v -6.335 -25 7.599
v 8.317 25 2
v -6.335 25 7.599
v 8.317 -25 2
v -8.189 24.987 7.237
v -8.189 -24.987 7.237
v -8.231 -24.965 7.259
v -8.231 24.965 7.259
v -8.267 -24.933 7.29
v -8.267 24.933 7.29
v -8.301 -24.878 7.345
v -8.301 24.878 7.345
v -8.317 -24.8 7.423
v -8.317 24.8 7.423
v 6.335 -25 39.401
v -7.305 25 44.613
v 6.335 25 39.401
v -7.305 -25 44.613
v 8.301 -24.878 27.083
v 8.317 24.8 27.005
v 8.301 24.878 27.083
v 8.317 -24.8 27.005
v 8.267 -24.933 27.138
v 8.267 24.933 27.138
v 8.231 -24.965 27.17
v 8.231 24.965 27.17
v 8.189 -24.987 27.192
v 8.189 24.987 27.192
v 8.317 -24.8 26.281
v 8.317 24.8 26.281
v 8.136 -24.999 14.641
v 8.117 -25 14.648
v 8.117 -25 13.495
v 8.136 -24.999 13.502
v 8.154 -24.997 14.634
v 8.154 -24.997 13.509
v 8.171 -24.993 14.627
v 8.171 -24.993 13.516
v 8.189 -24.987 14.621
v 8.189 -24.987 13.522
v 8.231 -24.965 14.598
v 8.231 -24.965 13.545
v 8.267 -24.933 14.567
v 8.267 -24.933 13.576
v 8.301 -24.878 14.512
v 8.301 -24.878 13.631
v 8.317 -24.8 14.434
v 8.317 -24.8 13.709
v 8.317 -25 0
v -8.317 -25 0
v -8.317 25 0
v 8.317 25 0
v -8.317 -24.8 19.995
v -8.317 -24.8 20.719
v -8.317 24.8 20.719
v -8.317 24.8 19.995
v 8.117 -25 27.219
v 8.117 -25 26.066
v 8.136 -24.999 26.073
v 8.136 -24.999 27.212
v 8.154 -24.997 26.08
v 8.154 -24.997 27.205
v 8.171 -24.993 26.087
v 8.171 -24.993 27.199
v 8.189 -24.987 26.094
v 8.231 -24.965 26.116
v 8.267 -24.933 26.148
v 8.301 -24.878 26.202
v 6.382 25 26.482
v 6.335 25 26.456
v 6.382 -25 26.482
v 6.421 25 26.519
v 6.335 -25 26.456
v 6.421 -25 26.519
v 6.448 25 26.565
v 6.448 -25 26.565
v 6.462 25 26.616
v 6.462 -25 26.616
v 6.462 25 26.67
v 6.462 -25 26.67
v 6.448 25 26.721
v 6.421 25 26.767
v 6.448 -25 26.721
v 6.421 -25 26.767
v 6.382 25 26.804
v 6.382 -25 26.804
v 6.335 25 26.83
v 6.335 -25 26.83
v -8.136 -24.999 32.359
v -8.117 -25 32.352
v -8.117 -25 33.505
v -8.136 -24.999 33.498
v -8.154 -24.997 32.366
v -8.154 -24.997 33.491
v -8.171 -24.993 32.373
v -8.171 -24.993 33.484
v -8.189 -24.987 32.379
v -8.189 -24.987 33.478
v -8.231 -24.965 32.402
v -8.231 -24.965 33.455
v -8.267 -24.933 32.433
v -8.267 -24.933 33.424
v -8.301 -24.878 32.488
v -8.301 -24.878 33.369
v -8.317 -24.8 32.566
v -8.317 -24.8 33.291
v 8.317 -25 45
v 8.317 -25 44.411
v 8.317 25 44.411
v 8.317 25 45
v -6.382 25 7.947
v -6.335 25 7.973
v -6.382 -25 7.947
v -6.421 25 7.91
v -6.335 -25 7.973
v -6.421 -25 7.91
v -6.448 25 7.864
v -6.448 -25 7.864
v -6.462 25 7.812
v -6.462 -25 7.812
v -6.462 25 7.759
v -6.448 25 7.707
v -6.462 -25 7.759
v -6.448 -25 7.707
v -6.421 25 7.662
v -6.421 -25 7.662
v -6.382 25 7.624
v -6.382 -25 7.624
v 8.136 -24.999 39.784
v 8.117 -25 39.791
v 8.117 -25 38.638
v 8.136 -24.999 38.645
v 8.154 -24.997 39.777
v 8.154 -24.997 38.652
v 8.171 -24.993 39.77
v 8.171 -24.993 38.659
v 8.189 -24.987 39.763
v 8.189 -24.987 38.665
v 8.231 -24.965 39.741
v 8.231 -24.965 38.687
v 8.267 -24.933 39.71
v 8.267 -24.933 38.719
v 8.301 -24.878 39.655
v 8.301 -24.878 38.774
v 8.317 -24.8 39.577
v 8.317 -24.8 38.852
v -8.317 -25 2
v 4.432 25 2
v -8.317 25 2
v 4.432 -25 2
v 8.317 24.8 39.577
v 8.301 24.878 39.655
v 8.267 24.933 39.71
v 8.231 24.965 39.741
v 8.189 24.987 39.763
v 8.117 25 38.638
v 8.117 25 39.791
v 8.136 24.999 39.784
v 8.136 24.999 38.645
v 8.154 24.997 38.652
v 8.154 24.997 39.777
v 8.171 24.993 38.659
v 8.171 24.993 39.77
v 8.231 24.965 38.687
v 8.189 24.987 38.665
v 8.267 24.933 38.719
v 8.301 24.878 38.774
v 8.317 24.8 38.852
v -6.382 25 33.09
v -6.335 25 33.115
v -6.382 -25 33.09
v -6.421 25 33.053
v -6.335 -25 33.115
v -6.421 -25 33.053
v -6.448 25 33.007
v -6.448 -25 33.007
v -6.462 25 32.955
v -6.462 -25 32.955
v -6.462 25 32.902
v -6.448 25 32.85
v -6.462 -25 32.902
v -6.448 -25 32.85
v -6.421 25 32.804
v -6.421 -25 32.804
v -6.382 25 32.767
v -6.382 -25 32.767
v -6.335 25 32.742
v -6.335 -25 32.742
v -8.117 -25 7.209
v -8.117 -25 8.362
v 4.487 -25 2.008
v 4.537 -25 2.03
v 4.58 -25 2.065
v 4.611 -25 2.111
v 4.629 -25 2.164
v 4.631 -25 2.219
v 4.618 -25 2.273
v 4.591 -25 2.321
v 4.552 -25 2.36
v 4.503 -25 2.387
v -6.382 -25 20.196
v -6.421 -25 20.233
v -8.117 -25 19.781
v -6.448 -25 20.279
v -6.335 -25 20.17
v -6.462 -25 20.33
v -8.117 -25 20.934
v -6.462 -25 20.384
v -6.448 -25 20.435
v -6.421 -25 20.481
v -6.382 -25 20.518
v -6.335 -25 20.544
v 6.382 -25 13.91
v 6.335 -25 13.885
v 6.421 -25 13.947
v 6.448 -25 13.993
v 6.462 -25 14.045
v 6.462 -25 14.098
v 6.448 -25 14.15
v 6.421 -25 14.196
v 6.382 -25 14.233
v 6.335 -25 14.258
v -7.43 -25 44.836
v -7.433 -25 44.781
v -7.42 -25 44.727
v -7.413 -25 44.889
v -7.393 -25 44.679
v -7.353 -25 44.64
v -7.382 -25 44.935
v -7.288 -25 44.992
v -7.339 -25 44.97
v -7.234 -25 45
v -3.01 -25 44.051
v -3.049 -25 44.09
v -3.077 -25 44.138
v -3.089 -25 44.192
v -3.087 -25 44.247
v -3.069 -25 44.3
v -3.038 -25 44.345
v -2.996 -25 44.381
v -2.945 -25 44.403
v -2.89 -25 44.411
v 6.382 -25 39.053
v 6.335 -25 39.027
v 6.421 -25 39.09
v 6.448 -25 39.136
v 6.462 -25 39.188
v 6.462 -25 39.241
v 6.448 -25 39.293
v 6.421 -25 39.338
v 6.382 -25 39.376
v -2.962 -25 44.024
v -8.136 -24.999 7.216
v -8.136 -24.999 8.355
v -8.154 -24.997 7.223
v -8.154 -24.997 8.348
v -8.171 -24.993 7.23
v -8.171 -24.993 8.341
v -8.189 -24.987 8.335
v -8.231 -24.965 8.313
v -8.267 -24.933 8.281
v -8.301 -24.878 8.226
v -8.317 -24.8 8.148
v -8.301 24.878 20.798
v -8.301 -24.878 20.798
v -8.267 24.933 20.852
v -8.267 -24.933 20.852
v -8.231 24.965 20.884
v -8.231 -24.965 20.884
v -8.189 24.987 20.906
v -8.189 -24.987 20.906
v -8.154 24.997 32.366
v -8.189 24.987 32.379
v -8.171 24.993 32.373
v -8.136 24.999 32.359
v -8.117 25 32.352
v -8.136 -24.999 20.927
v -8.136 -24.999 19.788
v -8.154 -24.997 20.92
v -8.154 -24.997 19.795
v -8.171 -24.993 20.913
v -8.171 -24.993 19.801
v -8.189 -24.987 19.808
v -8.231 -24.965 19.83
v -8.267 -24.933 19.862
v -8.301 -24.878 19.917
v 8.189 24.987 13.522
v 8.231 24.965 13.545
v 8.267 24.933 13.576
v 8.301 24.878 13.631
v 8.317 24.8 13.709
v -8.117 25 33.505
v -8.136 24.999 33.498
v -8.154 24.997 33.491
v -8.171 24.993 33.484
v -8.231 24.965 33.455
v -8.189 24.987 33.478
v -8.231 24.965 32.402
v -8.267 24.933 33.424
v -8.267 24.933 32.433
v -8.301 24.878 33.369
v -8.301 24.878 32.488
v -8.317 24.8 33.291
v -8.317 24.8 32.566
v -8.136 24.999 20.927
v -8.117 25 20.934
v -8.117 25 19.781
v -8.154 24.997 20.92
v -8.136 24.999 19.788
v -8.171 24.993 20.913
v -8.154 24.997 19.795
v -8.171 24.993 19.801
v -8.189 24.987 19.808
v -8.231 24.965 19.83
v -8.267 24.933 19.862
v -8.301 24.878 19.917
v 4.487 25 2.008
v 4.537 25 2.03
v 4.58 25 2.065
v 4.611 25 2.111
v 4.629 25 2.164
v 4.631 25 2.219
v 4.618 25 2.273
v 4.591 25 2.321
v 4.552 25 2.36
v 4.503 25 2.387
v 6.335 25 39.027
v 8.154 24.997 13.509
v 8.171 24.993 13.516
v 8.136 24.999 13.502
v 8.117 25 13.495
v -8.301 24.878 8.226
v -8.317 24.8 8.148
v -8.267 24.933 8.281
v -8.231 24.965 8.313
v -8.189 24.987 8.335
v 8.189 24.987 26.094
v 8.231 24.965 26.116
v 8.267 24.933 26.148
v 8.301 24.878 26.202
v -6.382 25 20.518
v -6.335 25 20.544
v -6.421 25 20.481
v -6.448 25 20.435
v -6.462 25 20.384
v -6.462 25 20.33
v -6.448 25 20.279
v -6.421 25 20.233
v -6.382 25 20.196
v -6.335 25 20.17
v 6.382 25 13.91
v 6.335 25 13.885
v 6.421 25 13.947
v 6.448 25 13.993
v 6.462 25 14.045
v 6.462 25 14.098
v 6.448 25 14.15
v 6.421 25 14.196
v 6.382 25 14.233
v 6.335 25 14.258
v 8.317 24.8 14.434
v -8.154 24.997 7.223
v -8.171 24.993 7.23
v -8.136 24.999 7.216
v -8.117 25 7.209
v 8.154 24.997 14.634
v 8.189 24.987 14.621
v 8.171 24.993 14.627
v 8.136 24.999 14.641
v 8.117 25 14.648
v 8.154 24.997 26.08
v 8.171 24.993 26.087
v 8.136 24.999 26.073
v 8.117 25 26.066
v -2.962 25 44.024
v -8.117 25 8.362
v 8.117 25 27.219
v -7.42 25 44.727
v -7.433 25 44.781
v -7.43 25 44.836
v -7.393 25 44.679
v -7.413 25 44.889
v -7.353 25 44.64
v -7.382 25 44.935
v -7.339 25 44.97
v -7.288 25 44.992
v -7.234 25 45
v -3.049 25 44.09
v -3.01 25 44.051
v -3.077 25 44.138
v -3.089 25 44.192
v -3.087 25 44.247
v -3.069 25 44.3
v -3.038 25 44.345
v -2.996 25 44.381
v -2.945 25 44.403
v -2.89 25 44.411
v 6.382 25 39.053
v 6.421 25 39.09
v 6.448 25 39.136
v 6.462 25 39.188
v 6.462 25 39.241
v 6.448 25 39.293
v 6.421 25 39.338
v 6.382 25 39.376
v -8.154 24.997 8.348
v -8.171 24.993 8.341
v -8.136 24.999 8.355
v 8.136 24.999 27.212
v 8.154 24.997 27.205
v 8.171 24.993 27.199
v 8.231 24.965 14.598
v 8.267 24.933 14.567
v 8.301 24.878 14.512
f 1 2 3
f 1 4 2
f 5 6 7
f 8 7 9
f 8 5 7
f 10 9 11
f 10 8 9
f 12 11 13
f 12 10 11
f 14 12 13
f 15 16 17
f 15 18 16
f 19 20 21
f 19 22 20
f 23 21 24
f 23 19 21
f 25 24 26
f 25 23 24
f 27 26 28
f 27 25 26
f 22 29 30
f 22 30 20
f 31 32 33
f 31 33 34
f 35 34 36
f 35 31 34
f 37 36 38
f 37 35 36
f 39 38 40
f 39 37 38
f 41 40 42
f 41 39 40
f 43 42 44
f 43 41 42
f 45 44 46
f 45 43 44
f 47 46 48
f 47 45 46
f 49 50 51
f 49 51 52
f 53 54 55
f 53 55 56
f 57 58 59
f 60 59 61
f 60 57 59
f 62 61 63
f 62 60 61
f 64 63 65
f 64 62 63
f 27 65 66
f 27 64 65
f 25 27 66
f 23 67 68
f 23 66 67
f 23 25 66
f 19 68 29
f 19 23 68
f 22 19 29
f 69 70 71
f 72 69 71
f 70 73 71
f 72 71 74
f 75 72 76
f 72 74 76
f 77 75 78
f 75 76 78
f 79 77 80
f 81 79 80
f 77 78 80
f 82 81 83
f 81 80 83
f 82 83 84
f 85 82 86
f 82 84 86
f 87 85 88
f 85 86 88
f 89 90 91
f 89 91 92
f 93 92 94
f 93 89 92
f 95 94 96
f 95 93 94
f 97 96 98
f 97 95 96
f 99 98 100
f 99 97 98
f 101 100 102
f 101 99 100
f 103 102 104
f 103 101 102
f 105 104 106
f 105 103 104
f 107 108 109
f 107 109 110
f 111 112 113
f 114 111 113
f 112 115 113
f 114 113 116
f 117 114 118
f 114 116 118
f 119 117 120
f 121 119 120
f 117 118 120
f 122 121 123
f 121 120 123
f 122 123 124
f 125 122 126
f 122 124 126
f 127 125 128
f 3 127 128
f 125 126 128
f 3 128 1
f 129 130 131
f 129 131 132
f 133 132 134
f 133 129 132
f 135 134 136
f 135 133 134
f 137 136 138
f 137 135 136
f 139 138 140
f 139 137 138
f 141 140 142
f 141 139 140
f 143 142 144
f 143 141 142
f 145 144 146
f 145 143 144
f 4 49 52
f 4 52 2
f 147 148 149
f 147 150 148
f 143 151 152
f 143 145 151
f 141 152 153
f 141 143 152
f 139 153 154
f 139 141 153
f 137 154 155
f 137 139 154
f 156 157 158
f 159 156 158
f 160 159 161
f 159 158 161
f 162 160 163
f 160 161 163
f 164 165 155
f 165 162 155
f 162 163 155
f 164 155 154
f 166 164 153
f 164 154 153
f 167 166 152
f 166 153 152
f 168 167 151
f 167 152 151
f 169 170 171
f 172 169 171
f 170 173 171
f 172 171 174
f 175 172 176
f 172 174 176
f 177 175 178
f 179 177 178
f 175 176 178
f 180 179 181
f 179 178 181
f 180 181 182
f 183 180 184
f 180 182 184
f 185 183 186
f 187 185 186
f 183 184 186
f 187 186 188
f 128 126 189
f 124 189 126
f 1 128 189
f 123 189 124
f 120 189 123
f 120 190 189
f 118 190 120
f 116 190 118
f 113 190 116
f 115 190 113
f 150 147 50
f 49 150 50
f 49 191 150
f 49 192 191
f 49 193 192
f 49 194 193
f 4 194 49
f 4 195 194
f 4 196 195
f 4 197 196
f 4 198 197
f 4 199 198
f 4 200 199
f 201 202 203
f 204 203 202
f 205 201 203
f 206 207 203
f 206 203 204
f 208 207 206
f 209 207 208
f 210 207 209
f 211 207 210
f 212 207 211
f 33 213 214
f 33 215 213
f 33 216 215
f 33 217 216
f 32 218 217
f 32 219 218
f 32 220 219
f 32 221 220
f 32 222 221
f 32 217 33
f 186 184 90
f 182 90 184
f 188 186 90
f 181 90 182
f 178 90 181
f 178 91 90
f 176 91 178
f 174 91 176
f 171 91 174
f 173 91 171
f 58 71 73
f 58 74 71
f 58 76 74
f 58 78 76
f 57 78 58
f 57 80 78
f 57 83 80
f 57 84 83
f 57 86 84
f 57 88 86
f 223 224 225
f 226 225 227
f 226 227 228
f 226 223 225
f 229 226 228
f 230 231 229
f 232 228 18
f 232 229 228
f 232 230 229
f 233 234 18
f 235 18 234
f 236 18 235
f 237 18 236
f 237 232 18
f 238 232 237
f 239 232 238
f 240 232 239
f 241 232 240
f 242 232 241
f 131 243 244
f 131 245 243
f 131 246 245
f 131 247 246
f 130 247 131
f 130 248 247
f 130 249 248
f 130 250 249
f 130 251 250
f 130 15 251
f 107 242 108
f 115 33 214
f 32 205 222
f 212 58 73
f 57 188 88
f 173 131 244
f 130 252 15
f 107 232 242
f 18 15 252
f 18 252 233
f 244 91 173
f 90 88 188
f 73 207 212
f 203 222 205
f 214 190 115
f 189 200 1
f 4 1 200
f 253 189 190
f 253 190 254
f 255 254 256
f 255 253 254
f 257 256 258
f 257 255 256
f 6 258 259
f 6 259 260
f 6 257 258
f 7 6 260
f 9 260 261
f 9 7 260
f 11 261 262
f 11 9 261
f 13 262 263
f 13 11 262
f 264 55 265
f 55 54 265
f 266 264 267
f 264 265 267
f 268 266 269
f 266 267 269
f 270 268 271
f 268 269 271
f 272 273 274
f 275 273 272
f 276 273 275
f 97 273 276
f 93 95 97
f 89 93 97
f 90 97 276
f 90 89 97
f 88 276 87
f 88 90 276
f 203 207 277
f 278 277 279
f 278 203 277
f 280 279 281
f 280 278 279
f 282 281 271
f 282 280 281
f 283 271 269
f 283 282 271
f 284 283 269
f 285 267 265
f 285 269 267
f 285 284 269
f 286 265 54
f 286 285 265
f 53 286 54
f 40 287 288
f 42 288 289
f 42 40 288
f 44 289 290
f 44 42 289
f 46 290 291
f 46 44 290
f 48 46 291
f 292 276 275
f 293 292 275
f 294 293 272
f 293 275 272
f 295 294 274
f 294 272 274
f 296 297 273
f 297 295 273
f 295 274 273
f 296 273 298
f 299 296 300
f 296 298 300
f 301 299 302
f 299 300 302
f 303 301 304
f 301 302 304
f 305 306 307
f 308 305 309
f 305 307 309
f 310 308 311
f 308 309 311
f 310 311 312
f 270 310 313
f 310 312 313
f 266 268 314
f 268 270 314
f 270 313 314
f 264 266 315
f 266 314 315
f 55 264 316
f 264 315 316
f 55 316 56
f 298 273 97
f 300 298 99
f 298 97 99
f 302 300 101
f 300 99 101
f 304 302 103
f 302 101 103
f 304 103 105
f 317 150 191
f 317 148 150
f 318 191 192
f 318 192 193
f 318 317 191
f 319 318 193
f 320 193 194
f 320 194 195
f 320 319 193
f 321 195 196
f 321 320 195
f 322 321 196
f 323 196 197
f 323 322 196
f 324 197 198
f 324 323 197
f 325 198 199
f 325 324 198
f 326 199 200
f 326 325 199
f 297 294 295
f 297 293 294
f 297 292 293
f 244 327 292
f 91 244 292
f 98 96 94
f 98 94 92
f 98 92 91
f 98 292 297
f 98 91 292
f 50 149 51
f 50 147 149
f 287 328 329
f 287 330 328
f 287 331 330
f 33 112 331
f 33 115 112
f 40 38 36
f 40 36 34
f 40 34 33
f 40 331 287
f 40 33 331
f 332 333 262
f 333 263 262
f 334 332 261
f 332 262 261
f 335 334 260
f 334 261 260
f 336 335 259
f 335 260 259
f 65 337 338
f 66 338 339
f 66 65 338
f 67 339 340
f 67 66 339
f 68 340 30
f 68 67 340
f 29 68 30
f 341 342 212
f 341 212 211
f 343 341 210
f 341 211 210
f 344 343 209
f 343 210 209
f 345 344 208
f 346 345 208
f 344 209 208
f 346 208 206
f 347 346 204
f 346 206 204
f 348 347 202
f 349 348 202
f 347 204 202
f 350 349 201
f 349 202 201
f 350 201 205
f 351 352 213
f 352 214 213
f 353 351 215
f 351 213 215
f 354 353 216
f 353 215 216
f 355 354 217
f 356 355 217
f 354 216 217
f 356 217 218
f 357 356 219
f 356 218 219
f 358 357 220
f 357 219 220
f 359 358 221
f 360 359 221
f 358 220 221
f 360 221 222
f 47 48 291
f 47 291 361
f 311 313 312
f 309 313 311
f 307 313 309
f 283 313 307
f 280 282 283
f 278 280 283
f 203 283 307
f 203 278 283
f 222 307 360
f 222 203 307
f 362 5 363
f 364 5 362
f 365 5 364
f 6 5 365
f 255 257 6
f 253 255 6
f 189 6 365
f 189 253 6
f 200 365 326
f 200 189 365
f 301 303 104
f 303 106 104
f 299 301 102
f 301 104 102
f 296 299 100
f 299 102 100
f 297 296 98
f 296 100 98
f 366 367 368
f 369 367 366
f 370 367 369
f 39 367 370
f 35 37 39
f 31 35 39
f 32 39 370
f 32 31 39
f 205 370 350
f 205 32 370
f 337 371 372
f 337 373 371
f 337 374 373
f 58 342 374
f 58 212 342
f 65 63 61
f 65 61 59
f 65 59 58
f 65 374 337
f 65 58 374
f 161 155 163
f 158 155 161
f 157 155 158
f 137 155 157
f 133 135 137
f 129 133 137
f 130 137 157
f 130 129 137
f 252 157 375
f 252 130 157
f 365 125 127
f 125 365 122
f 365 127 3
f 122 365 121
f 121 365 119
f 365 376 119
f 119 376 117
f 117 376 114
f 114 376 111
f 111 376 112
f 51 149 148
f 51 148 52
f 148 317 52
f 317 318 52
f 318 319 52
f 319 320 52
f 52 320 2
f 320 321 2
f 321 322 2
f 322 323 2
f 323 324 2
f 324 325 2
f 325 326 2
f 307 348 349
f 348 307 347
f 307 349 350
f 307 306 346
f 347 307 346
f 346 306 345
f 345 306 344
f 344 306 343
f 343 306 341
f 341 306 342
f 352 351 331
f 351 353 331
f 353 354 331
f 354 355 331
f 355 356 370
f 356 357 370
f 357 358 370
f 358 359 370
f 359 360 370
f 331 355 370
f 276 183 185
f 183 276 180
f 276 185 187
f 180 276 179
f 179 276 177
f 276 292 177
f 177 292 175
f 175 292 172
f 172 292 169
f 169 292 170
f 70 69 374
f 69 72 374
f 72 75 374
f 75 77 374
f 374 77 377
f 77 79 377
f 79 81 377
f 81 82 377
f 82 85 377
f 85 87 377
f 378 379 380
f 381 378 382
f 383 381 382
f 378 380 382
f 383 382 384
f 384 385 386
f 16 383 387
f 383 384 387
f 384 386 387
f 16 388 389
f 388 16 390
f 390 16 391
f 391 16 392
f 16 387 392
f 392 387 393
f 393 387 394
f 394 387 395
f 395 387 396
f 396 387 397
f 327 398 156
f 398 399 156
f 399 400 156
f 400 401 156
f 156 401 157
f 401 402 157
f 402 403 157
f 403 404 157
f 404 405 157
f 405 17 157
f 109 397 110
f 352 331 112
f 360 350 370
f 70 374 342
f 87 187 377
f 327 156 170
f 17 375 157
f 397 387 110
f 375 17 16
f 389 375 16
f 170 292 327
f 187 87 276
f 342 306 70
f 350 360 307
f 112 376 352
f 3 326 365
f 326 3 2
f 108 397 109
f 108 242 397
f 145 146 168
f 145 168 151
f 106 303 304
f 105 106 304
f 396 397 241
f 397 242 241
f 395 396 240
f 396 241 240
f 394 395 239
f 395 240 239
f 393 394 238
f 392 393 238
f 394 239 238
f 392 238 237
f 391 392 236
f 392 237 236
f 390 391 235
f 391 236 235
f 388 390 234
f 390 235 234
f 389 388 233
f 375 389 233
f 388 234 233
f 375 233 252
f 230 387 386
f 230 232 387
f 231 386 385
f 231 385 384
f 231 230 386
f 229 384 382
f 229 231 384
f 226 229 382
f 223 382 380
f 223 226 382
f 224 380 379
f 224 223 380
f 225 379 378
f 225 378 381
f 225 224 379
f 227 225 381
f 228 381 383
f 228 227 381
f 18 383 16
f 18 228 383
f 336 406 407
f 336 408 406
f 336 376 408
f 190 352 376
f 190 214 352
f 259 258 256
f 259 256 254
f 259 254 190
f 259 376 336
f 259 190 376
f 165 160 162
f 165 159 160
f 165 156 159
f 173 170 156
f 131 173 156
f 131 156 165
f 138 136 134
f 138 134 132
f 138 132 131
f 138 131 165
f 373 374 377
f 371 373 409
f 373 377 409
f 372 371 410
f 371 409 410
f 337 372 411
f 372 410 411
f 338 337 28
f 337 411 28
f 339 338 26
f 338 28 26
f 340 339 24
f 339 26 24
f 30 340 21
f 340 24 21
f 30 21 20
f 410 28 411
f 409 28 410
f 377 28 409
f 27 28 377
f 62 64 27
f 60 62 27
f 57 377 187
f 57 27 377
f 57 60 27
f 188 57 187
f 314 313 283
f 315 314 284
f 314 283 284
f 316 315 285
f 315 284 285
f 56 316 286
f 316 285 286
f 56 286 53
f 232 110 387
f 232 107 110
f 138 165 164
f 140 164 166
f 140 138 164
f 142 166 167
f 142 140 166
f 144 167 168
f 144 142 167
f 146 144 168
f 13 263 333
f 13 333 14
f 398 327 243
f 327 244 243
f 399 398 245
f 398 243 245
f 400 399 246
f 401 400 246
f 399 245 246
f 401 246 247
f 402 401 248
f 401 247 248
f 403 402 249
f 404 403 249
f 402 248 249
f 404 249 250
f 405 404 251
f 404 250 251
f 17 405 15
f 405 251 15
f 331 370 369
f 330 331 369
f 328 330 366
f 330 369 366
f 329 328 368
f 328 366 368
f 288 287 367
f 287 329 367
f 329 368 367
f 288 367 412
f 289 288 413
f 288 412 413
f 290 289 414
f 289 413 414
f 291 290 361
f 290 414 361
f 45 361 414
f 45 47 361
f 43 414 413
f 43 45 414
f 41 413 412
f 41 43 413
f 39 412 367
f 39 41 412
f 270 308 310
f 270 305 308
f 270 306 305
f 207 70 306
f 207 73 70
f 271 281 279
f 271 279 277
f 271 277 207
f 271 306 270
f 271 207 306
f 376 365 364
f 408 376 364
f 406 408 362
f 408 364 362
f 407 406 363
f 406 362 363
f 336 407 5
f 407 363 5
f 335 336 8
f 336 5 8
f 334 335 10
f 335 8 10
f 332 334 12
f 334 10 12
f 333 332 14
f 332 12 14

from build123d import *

# Parameters (mm, degrees)
F1_DEPTH = 25
F2_R     = 0.2
F3_R     = 0.2


with BuildPart() as f1:
    # F0 (on Front) → F1 (new body, symmetric)
    with BuildSketch(Plane.XZ):
        Polygon((-8.317317, 2), (-8.317317, 0), (8.317317, 0), (8.317317, 2), (5.515711, 2), align=None)
        Polygon((-8.317317, 7.285714), (5.515711, 2), (8.317317, 2), (-6.82424, 7.785714), (8.317317, 13.571429), (8.317317, 14.571429), (-6.82424, 20.357143), (8.317317, 26.142857), (8.317317, 27.142857), (-6.82424, 32.928571), (8.317317, 38.714286), (8.317317, 39.714286), (-3.974019, 44.410907), (8.317317, 44.410907), (8.317317, 45), (-8.317317, 45), (6.82424, 39.214286), (-8.317317, 33.428571), (-8.317317, 32.428571), (6.82424, 26.642857), (-8.317317, 20.857143), (-8.317317, 19.857143), (6.82424, 14.071429), (-8.317317, 8.285714), align=None)
    extrude(amount=F1_DEPTH, both=True)

    # F2
    f2_edges = [f1.edges().sort_by_distance(p)[0] for p in [
        (-6.82424, 0, 32.928571),
        (-3.974019, 0, 44.410907),
        (-6.82424, 0, 20.357143),
        (-6.82424, 0, 7.785714),
        (5.515711, 0, 2),
        (6.82424, 0, 14.071429),
        (6.82424, 0, 26.642857),
        (6.82424, 0, 39.214286),
    ]]
    fillet(f2_edges, radius=F2_R)

    # F3
    f3_edges = [f1.edges().sort_by_distance(p)[0] for p in [
        (-8.317317, 0, 8.285714),
        (-8.317317, 25, 7.785714),
        (-8.317317, 0, 7.285714),
        (-8.317317, -25, 7.785714),
        (-8.317317, 0, 20.857143),
        (-8.317317, 25, 20.357143),
        (-8.317317, 0, 19.857143),
        (-8.317317, -25, 20.357143),
        (-8.317317, 25, 32.928571),
        (-8.317317, 0, 32.428571),
        (-8.317317, -25, 32.928571),
        (-8.317317, 0, 33.428571),
        (-8.317317, 0, 45),
        (8.317317, 0, 38.714286),
        (8.317317, 25, 39.214286),
        (8.317317, 0, 39.714286),
        (8.317317, -25, 39.214286),
        (8.317317, 0, 26.142857),
        (8.317317, 25, 26.642857),
        (8.317317, 0, 27.142857),
        (8.317317, -25, 26.642857),
        (8.317317, 0, 13.571429),
        (8.317317, 25, 14.071429),
        (8.317317, 0, 14.571429),
        (8.317317, -25, 14.071429),
    ]]
    fillet(f3_edges, radius=F3_R)


solid = f1.part
